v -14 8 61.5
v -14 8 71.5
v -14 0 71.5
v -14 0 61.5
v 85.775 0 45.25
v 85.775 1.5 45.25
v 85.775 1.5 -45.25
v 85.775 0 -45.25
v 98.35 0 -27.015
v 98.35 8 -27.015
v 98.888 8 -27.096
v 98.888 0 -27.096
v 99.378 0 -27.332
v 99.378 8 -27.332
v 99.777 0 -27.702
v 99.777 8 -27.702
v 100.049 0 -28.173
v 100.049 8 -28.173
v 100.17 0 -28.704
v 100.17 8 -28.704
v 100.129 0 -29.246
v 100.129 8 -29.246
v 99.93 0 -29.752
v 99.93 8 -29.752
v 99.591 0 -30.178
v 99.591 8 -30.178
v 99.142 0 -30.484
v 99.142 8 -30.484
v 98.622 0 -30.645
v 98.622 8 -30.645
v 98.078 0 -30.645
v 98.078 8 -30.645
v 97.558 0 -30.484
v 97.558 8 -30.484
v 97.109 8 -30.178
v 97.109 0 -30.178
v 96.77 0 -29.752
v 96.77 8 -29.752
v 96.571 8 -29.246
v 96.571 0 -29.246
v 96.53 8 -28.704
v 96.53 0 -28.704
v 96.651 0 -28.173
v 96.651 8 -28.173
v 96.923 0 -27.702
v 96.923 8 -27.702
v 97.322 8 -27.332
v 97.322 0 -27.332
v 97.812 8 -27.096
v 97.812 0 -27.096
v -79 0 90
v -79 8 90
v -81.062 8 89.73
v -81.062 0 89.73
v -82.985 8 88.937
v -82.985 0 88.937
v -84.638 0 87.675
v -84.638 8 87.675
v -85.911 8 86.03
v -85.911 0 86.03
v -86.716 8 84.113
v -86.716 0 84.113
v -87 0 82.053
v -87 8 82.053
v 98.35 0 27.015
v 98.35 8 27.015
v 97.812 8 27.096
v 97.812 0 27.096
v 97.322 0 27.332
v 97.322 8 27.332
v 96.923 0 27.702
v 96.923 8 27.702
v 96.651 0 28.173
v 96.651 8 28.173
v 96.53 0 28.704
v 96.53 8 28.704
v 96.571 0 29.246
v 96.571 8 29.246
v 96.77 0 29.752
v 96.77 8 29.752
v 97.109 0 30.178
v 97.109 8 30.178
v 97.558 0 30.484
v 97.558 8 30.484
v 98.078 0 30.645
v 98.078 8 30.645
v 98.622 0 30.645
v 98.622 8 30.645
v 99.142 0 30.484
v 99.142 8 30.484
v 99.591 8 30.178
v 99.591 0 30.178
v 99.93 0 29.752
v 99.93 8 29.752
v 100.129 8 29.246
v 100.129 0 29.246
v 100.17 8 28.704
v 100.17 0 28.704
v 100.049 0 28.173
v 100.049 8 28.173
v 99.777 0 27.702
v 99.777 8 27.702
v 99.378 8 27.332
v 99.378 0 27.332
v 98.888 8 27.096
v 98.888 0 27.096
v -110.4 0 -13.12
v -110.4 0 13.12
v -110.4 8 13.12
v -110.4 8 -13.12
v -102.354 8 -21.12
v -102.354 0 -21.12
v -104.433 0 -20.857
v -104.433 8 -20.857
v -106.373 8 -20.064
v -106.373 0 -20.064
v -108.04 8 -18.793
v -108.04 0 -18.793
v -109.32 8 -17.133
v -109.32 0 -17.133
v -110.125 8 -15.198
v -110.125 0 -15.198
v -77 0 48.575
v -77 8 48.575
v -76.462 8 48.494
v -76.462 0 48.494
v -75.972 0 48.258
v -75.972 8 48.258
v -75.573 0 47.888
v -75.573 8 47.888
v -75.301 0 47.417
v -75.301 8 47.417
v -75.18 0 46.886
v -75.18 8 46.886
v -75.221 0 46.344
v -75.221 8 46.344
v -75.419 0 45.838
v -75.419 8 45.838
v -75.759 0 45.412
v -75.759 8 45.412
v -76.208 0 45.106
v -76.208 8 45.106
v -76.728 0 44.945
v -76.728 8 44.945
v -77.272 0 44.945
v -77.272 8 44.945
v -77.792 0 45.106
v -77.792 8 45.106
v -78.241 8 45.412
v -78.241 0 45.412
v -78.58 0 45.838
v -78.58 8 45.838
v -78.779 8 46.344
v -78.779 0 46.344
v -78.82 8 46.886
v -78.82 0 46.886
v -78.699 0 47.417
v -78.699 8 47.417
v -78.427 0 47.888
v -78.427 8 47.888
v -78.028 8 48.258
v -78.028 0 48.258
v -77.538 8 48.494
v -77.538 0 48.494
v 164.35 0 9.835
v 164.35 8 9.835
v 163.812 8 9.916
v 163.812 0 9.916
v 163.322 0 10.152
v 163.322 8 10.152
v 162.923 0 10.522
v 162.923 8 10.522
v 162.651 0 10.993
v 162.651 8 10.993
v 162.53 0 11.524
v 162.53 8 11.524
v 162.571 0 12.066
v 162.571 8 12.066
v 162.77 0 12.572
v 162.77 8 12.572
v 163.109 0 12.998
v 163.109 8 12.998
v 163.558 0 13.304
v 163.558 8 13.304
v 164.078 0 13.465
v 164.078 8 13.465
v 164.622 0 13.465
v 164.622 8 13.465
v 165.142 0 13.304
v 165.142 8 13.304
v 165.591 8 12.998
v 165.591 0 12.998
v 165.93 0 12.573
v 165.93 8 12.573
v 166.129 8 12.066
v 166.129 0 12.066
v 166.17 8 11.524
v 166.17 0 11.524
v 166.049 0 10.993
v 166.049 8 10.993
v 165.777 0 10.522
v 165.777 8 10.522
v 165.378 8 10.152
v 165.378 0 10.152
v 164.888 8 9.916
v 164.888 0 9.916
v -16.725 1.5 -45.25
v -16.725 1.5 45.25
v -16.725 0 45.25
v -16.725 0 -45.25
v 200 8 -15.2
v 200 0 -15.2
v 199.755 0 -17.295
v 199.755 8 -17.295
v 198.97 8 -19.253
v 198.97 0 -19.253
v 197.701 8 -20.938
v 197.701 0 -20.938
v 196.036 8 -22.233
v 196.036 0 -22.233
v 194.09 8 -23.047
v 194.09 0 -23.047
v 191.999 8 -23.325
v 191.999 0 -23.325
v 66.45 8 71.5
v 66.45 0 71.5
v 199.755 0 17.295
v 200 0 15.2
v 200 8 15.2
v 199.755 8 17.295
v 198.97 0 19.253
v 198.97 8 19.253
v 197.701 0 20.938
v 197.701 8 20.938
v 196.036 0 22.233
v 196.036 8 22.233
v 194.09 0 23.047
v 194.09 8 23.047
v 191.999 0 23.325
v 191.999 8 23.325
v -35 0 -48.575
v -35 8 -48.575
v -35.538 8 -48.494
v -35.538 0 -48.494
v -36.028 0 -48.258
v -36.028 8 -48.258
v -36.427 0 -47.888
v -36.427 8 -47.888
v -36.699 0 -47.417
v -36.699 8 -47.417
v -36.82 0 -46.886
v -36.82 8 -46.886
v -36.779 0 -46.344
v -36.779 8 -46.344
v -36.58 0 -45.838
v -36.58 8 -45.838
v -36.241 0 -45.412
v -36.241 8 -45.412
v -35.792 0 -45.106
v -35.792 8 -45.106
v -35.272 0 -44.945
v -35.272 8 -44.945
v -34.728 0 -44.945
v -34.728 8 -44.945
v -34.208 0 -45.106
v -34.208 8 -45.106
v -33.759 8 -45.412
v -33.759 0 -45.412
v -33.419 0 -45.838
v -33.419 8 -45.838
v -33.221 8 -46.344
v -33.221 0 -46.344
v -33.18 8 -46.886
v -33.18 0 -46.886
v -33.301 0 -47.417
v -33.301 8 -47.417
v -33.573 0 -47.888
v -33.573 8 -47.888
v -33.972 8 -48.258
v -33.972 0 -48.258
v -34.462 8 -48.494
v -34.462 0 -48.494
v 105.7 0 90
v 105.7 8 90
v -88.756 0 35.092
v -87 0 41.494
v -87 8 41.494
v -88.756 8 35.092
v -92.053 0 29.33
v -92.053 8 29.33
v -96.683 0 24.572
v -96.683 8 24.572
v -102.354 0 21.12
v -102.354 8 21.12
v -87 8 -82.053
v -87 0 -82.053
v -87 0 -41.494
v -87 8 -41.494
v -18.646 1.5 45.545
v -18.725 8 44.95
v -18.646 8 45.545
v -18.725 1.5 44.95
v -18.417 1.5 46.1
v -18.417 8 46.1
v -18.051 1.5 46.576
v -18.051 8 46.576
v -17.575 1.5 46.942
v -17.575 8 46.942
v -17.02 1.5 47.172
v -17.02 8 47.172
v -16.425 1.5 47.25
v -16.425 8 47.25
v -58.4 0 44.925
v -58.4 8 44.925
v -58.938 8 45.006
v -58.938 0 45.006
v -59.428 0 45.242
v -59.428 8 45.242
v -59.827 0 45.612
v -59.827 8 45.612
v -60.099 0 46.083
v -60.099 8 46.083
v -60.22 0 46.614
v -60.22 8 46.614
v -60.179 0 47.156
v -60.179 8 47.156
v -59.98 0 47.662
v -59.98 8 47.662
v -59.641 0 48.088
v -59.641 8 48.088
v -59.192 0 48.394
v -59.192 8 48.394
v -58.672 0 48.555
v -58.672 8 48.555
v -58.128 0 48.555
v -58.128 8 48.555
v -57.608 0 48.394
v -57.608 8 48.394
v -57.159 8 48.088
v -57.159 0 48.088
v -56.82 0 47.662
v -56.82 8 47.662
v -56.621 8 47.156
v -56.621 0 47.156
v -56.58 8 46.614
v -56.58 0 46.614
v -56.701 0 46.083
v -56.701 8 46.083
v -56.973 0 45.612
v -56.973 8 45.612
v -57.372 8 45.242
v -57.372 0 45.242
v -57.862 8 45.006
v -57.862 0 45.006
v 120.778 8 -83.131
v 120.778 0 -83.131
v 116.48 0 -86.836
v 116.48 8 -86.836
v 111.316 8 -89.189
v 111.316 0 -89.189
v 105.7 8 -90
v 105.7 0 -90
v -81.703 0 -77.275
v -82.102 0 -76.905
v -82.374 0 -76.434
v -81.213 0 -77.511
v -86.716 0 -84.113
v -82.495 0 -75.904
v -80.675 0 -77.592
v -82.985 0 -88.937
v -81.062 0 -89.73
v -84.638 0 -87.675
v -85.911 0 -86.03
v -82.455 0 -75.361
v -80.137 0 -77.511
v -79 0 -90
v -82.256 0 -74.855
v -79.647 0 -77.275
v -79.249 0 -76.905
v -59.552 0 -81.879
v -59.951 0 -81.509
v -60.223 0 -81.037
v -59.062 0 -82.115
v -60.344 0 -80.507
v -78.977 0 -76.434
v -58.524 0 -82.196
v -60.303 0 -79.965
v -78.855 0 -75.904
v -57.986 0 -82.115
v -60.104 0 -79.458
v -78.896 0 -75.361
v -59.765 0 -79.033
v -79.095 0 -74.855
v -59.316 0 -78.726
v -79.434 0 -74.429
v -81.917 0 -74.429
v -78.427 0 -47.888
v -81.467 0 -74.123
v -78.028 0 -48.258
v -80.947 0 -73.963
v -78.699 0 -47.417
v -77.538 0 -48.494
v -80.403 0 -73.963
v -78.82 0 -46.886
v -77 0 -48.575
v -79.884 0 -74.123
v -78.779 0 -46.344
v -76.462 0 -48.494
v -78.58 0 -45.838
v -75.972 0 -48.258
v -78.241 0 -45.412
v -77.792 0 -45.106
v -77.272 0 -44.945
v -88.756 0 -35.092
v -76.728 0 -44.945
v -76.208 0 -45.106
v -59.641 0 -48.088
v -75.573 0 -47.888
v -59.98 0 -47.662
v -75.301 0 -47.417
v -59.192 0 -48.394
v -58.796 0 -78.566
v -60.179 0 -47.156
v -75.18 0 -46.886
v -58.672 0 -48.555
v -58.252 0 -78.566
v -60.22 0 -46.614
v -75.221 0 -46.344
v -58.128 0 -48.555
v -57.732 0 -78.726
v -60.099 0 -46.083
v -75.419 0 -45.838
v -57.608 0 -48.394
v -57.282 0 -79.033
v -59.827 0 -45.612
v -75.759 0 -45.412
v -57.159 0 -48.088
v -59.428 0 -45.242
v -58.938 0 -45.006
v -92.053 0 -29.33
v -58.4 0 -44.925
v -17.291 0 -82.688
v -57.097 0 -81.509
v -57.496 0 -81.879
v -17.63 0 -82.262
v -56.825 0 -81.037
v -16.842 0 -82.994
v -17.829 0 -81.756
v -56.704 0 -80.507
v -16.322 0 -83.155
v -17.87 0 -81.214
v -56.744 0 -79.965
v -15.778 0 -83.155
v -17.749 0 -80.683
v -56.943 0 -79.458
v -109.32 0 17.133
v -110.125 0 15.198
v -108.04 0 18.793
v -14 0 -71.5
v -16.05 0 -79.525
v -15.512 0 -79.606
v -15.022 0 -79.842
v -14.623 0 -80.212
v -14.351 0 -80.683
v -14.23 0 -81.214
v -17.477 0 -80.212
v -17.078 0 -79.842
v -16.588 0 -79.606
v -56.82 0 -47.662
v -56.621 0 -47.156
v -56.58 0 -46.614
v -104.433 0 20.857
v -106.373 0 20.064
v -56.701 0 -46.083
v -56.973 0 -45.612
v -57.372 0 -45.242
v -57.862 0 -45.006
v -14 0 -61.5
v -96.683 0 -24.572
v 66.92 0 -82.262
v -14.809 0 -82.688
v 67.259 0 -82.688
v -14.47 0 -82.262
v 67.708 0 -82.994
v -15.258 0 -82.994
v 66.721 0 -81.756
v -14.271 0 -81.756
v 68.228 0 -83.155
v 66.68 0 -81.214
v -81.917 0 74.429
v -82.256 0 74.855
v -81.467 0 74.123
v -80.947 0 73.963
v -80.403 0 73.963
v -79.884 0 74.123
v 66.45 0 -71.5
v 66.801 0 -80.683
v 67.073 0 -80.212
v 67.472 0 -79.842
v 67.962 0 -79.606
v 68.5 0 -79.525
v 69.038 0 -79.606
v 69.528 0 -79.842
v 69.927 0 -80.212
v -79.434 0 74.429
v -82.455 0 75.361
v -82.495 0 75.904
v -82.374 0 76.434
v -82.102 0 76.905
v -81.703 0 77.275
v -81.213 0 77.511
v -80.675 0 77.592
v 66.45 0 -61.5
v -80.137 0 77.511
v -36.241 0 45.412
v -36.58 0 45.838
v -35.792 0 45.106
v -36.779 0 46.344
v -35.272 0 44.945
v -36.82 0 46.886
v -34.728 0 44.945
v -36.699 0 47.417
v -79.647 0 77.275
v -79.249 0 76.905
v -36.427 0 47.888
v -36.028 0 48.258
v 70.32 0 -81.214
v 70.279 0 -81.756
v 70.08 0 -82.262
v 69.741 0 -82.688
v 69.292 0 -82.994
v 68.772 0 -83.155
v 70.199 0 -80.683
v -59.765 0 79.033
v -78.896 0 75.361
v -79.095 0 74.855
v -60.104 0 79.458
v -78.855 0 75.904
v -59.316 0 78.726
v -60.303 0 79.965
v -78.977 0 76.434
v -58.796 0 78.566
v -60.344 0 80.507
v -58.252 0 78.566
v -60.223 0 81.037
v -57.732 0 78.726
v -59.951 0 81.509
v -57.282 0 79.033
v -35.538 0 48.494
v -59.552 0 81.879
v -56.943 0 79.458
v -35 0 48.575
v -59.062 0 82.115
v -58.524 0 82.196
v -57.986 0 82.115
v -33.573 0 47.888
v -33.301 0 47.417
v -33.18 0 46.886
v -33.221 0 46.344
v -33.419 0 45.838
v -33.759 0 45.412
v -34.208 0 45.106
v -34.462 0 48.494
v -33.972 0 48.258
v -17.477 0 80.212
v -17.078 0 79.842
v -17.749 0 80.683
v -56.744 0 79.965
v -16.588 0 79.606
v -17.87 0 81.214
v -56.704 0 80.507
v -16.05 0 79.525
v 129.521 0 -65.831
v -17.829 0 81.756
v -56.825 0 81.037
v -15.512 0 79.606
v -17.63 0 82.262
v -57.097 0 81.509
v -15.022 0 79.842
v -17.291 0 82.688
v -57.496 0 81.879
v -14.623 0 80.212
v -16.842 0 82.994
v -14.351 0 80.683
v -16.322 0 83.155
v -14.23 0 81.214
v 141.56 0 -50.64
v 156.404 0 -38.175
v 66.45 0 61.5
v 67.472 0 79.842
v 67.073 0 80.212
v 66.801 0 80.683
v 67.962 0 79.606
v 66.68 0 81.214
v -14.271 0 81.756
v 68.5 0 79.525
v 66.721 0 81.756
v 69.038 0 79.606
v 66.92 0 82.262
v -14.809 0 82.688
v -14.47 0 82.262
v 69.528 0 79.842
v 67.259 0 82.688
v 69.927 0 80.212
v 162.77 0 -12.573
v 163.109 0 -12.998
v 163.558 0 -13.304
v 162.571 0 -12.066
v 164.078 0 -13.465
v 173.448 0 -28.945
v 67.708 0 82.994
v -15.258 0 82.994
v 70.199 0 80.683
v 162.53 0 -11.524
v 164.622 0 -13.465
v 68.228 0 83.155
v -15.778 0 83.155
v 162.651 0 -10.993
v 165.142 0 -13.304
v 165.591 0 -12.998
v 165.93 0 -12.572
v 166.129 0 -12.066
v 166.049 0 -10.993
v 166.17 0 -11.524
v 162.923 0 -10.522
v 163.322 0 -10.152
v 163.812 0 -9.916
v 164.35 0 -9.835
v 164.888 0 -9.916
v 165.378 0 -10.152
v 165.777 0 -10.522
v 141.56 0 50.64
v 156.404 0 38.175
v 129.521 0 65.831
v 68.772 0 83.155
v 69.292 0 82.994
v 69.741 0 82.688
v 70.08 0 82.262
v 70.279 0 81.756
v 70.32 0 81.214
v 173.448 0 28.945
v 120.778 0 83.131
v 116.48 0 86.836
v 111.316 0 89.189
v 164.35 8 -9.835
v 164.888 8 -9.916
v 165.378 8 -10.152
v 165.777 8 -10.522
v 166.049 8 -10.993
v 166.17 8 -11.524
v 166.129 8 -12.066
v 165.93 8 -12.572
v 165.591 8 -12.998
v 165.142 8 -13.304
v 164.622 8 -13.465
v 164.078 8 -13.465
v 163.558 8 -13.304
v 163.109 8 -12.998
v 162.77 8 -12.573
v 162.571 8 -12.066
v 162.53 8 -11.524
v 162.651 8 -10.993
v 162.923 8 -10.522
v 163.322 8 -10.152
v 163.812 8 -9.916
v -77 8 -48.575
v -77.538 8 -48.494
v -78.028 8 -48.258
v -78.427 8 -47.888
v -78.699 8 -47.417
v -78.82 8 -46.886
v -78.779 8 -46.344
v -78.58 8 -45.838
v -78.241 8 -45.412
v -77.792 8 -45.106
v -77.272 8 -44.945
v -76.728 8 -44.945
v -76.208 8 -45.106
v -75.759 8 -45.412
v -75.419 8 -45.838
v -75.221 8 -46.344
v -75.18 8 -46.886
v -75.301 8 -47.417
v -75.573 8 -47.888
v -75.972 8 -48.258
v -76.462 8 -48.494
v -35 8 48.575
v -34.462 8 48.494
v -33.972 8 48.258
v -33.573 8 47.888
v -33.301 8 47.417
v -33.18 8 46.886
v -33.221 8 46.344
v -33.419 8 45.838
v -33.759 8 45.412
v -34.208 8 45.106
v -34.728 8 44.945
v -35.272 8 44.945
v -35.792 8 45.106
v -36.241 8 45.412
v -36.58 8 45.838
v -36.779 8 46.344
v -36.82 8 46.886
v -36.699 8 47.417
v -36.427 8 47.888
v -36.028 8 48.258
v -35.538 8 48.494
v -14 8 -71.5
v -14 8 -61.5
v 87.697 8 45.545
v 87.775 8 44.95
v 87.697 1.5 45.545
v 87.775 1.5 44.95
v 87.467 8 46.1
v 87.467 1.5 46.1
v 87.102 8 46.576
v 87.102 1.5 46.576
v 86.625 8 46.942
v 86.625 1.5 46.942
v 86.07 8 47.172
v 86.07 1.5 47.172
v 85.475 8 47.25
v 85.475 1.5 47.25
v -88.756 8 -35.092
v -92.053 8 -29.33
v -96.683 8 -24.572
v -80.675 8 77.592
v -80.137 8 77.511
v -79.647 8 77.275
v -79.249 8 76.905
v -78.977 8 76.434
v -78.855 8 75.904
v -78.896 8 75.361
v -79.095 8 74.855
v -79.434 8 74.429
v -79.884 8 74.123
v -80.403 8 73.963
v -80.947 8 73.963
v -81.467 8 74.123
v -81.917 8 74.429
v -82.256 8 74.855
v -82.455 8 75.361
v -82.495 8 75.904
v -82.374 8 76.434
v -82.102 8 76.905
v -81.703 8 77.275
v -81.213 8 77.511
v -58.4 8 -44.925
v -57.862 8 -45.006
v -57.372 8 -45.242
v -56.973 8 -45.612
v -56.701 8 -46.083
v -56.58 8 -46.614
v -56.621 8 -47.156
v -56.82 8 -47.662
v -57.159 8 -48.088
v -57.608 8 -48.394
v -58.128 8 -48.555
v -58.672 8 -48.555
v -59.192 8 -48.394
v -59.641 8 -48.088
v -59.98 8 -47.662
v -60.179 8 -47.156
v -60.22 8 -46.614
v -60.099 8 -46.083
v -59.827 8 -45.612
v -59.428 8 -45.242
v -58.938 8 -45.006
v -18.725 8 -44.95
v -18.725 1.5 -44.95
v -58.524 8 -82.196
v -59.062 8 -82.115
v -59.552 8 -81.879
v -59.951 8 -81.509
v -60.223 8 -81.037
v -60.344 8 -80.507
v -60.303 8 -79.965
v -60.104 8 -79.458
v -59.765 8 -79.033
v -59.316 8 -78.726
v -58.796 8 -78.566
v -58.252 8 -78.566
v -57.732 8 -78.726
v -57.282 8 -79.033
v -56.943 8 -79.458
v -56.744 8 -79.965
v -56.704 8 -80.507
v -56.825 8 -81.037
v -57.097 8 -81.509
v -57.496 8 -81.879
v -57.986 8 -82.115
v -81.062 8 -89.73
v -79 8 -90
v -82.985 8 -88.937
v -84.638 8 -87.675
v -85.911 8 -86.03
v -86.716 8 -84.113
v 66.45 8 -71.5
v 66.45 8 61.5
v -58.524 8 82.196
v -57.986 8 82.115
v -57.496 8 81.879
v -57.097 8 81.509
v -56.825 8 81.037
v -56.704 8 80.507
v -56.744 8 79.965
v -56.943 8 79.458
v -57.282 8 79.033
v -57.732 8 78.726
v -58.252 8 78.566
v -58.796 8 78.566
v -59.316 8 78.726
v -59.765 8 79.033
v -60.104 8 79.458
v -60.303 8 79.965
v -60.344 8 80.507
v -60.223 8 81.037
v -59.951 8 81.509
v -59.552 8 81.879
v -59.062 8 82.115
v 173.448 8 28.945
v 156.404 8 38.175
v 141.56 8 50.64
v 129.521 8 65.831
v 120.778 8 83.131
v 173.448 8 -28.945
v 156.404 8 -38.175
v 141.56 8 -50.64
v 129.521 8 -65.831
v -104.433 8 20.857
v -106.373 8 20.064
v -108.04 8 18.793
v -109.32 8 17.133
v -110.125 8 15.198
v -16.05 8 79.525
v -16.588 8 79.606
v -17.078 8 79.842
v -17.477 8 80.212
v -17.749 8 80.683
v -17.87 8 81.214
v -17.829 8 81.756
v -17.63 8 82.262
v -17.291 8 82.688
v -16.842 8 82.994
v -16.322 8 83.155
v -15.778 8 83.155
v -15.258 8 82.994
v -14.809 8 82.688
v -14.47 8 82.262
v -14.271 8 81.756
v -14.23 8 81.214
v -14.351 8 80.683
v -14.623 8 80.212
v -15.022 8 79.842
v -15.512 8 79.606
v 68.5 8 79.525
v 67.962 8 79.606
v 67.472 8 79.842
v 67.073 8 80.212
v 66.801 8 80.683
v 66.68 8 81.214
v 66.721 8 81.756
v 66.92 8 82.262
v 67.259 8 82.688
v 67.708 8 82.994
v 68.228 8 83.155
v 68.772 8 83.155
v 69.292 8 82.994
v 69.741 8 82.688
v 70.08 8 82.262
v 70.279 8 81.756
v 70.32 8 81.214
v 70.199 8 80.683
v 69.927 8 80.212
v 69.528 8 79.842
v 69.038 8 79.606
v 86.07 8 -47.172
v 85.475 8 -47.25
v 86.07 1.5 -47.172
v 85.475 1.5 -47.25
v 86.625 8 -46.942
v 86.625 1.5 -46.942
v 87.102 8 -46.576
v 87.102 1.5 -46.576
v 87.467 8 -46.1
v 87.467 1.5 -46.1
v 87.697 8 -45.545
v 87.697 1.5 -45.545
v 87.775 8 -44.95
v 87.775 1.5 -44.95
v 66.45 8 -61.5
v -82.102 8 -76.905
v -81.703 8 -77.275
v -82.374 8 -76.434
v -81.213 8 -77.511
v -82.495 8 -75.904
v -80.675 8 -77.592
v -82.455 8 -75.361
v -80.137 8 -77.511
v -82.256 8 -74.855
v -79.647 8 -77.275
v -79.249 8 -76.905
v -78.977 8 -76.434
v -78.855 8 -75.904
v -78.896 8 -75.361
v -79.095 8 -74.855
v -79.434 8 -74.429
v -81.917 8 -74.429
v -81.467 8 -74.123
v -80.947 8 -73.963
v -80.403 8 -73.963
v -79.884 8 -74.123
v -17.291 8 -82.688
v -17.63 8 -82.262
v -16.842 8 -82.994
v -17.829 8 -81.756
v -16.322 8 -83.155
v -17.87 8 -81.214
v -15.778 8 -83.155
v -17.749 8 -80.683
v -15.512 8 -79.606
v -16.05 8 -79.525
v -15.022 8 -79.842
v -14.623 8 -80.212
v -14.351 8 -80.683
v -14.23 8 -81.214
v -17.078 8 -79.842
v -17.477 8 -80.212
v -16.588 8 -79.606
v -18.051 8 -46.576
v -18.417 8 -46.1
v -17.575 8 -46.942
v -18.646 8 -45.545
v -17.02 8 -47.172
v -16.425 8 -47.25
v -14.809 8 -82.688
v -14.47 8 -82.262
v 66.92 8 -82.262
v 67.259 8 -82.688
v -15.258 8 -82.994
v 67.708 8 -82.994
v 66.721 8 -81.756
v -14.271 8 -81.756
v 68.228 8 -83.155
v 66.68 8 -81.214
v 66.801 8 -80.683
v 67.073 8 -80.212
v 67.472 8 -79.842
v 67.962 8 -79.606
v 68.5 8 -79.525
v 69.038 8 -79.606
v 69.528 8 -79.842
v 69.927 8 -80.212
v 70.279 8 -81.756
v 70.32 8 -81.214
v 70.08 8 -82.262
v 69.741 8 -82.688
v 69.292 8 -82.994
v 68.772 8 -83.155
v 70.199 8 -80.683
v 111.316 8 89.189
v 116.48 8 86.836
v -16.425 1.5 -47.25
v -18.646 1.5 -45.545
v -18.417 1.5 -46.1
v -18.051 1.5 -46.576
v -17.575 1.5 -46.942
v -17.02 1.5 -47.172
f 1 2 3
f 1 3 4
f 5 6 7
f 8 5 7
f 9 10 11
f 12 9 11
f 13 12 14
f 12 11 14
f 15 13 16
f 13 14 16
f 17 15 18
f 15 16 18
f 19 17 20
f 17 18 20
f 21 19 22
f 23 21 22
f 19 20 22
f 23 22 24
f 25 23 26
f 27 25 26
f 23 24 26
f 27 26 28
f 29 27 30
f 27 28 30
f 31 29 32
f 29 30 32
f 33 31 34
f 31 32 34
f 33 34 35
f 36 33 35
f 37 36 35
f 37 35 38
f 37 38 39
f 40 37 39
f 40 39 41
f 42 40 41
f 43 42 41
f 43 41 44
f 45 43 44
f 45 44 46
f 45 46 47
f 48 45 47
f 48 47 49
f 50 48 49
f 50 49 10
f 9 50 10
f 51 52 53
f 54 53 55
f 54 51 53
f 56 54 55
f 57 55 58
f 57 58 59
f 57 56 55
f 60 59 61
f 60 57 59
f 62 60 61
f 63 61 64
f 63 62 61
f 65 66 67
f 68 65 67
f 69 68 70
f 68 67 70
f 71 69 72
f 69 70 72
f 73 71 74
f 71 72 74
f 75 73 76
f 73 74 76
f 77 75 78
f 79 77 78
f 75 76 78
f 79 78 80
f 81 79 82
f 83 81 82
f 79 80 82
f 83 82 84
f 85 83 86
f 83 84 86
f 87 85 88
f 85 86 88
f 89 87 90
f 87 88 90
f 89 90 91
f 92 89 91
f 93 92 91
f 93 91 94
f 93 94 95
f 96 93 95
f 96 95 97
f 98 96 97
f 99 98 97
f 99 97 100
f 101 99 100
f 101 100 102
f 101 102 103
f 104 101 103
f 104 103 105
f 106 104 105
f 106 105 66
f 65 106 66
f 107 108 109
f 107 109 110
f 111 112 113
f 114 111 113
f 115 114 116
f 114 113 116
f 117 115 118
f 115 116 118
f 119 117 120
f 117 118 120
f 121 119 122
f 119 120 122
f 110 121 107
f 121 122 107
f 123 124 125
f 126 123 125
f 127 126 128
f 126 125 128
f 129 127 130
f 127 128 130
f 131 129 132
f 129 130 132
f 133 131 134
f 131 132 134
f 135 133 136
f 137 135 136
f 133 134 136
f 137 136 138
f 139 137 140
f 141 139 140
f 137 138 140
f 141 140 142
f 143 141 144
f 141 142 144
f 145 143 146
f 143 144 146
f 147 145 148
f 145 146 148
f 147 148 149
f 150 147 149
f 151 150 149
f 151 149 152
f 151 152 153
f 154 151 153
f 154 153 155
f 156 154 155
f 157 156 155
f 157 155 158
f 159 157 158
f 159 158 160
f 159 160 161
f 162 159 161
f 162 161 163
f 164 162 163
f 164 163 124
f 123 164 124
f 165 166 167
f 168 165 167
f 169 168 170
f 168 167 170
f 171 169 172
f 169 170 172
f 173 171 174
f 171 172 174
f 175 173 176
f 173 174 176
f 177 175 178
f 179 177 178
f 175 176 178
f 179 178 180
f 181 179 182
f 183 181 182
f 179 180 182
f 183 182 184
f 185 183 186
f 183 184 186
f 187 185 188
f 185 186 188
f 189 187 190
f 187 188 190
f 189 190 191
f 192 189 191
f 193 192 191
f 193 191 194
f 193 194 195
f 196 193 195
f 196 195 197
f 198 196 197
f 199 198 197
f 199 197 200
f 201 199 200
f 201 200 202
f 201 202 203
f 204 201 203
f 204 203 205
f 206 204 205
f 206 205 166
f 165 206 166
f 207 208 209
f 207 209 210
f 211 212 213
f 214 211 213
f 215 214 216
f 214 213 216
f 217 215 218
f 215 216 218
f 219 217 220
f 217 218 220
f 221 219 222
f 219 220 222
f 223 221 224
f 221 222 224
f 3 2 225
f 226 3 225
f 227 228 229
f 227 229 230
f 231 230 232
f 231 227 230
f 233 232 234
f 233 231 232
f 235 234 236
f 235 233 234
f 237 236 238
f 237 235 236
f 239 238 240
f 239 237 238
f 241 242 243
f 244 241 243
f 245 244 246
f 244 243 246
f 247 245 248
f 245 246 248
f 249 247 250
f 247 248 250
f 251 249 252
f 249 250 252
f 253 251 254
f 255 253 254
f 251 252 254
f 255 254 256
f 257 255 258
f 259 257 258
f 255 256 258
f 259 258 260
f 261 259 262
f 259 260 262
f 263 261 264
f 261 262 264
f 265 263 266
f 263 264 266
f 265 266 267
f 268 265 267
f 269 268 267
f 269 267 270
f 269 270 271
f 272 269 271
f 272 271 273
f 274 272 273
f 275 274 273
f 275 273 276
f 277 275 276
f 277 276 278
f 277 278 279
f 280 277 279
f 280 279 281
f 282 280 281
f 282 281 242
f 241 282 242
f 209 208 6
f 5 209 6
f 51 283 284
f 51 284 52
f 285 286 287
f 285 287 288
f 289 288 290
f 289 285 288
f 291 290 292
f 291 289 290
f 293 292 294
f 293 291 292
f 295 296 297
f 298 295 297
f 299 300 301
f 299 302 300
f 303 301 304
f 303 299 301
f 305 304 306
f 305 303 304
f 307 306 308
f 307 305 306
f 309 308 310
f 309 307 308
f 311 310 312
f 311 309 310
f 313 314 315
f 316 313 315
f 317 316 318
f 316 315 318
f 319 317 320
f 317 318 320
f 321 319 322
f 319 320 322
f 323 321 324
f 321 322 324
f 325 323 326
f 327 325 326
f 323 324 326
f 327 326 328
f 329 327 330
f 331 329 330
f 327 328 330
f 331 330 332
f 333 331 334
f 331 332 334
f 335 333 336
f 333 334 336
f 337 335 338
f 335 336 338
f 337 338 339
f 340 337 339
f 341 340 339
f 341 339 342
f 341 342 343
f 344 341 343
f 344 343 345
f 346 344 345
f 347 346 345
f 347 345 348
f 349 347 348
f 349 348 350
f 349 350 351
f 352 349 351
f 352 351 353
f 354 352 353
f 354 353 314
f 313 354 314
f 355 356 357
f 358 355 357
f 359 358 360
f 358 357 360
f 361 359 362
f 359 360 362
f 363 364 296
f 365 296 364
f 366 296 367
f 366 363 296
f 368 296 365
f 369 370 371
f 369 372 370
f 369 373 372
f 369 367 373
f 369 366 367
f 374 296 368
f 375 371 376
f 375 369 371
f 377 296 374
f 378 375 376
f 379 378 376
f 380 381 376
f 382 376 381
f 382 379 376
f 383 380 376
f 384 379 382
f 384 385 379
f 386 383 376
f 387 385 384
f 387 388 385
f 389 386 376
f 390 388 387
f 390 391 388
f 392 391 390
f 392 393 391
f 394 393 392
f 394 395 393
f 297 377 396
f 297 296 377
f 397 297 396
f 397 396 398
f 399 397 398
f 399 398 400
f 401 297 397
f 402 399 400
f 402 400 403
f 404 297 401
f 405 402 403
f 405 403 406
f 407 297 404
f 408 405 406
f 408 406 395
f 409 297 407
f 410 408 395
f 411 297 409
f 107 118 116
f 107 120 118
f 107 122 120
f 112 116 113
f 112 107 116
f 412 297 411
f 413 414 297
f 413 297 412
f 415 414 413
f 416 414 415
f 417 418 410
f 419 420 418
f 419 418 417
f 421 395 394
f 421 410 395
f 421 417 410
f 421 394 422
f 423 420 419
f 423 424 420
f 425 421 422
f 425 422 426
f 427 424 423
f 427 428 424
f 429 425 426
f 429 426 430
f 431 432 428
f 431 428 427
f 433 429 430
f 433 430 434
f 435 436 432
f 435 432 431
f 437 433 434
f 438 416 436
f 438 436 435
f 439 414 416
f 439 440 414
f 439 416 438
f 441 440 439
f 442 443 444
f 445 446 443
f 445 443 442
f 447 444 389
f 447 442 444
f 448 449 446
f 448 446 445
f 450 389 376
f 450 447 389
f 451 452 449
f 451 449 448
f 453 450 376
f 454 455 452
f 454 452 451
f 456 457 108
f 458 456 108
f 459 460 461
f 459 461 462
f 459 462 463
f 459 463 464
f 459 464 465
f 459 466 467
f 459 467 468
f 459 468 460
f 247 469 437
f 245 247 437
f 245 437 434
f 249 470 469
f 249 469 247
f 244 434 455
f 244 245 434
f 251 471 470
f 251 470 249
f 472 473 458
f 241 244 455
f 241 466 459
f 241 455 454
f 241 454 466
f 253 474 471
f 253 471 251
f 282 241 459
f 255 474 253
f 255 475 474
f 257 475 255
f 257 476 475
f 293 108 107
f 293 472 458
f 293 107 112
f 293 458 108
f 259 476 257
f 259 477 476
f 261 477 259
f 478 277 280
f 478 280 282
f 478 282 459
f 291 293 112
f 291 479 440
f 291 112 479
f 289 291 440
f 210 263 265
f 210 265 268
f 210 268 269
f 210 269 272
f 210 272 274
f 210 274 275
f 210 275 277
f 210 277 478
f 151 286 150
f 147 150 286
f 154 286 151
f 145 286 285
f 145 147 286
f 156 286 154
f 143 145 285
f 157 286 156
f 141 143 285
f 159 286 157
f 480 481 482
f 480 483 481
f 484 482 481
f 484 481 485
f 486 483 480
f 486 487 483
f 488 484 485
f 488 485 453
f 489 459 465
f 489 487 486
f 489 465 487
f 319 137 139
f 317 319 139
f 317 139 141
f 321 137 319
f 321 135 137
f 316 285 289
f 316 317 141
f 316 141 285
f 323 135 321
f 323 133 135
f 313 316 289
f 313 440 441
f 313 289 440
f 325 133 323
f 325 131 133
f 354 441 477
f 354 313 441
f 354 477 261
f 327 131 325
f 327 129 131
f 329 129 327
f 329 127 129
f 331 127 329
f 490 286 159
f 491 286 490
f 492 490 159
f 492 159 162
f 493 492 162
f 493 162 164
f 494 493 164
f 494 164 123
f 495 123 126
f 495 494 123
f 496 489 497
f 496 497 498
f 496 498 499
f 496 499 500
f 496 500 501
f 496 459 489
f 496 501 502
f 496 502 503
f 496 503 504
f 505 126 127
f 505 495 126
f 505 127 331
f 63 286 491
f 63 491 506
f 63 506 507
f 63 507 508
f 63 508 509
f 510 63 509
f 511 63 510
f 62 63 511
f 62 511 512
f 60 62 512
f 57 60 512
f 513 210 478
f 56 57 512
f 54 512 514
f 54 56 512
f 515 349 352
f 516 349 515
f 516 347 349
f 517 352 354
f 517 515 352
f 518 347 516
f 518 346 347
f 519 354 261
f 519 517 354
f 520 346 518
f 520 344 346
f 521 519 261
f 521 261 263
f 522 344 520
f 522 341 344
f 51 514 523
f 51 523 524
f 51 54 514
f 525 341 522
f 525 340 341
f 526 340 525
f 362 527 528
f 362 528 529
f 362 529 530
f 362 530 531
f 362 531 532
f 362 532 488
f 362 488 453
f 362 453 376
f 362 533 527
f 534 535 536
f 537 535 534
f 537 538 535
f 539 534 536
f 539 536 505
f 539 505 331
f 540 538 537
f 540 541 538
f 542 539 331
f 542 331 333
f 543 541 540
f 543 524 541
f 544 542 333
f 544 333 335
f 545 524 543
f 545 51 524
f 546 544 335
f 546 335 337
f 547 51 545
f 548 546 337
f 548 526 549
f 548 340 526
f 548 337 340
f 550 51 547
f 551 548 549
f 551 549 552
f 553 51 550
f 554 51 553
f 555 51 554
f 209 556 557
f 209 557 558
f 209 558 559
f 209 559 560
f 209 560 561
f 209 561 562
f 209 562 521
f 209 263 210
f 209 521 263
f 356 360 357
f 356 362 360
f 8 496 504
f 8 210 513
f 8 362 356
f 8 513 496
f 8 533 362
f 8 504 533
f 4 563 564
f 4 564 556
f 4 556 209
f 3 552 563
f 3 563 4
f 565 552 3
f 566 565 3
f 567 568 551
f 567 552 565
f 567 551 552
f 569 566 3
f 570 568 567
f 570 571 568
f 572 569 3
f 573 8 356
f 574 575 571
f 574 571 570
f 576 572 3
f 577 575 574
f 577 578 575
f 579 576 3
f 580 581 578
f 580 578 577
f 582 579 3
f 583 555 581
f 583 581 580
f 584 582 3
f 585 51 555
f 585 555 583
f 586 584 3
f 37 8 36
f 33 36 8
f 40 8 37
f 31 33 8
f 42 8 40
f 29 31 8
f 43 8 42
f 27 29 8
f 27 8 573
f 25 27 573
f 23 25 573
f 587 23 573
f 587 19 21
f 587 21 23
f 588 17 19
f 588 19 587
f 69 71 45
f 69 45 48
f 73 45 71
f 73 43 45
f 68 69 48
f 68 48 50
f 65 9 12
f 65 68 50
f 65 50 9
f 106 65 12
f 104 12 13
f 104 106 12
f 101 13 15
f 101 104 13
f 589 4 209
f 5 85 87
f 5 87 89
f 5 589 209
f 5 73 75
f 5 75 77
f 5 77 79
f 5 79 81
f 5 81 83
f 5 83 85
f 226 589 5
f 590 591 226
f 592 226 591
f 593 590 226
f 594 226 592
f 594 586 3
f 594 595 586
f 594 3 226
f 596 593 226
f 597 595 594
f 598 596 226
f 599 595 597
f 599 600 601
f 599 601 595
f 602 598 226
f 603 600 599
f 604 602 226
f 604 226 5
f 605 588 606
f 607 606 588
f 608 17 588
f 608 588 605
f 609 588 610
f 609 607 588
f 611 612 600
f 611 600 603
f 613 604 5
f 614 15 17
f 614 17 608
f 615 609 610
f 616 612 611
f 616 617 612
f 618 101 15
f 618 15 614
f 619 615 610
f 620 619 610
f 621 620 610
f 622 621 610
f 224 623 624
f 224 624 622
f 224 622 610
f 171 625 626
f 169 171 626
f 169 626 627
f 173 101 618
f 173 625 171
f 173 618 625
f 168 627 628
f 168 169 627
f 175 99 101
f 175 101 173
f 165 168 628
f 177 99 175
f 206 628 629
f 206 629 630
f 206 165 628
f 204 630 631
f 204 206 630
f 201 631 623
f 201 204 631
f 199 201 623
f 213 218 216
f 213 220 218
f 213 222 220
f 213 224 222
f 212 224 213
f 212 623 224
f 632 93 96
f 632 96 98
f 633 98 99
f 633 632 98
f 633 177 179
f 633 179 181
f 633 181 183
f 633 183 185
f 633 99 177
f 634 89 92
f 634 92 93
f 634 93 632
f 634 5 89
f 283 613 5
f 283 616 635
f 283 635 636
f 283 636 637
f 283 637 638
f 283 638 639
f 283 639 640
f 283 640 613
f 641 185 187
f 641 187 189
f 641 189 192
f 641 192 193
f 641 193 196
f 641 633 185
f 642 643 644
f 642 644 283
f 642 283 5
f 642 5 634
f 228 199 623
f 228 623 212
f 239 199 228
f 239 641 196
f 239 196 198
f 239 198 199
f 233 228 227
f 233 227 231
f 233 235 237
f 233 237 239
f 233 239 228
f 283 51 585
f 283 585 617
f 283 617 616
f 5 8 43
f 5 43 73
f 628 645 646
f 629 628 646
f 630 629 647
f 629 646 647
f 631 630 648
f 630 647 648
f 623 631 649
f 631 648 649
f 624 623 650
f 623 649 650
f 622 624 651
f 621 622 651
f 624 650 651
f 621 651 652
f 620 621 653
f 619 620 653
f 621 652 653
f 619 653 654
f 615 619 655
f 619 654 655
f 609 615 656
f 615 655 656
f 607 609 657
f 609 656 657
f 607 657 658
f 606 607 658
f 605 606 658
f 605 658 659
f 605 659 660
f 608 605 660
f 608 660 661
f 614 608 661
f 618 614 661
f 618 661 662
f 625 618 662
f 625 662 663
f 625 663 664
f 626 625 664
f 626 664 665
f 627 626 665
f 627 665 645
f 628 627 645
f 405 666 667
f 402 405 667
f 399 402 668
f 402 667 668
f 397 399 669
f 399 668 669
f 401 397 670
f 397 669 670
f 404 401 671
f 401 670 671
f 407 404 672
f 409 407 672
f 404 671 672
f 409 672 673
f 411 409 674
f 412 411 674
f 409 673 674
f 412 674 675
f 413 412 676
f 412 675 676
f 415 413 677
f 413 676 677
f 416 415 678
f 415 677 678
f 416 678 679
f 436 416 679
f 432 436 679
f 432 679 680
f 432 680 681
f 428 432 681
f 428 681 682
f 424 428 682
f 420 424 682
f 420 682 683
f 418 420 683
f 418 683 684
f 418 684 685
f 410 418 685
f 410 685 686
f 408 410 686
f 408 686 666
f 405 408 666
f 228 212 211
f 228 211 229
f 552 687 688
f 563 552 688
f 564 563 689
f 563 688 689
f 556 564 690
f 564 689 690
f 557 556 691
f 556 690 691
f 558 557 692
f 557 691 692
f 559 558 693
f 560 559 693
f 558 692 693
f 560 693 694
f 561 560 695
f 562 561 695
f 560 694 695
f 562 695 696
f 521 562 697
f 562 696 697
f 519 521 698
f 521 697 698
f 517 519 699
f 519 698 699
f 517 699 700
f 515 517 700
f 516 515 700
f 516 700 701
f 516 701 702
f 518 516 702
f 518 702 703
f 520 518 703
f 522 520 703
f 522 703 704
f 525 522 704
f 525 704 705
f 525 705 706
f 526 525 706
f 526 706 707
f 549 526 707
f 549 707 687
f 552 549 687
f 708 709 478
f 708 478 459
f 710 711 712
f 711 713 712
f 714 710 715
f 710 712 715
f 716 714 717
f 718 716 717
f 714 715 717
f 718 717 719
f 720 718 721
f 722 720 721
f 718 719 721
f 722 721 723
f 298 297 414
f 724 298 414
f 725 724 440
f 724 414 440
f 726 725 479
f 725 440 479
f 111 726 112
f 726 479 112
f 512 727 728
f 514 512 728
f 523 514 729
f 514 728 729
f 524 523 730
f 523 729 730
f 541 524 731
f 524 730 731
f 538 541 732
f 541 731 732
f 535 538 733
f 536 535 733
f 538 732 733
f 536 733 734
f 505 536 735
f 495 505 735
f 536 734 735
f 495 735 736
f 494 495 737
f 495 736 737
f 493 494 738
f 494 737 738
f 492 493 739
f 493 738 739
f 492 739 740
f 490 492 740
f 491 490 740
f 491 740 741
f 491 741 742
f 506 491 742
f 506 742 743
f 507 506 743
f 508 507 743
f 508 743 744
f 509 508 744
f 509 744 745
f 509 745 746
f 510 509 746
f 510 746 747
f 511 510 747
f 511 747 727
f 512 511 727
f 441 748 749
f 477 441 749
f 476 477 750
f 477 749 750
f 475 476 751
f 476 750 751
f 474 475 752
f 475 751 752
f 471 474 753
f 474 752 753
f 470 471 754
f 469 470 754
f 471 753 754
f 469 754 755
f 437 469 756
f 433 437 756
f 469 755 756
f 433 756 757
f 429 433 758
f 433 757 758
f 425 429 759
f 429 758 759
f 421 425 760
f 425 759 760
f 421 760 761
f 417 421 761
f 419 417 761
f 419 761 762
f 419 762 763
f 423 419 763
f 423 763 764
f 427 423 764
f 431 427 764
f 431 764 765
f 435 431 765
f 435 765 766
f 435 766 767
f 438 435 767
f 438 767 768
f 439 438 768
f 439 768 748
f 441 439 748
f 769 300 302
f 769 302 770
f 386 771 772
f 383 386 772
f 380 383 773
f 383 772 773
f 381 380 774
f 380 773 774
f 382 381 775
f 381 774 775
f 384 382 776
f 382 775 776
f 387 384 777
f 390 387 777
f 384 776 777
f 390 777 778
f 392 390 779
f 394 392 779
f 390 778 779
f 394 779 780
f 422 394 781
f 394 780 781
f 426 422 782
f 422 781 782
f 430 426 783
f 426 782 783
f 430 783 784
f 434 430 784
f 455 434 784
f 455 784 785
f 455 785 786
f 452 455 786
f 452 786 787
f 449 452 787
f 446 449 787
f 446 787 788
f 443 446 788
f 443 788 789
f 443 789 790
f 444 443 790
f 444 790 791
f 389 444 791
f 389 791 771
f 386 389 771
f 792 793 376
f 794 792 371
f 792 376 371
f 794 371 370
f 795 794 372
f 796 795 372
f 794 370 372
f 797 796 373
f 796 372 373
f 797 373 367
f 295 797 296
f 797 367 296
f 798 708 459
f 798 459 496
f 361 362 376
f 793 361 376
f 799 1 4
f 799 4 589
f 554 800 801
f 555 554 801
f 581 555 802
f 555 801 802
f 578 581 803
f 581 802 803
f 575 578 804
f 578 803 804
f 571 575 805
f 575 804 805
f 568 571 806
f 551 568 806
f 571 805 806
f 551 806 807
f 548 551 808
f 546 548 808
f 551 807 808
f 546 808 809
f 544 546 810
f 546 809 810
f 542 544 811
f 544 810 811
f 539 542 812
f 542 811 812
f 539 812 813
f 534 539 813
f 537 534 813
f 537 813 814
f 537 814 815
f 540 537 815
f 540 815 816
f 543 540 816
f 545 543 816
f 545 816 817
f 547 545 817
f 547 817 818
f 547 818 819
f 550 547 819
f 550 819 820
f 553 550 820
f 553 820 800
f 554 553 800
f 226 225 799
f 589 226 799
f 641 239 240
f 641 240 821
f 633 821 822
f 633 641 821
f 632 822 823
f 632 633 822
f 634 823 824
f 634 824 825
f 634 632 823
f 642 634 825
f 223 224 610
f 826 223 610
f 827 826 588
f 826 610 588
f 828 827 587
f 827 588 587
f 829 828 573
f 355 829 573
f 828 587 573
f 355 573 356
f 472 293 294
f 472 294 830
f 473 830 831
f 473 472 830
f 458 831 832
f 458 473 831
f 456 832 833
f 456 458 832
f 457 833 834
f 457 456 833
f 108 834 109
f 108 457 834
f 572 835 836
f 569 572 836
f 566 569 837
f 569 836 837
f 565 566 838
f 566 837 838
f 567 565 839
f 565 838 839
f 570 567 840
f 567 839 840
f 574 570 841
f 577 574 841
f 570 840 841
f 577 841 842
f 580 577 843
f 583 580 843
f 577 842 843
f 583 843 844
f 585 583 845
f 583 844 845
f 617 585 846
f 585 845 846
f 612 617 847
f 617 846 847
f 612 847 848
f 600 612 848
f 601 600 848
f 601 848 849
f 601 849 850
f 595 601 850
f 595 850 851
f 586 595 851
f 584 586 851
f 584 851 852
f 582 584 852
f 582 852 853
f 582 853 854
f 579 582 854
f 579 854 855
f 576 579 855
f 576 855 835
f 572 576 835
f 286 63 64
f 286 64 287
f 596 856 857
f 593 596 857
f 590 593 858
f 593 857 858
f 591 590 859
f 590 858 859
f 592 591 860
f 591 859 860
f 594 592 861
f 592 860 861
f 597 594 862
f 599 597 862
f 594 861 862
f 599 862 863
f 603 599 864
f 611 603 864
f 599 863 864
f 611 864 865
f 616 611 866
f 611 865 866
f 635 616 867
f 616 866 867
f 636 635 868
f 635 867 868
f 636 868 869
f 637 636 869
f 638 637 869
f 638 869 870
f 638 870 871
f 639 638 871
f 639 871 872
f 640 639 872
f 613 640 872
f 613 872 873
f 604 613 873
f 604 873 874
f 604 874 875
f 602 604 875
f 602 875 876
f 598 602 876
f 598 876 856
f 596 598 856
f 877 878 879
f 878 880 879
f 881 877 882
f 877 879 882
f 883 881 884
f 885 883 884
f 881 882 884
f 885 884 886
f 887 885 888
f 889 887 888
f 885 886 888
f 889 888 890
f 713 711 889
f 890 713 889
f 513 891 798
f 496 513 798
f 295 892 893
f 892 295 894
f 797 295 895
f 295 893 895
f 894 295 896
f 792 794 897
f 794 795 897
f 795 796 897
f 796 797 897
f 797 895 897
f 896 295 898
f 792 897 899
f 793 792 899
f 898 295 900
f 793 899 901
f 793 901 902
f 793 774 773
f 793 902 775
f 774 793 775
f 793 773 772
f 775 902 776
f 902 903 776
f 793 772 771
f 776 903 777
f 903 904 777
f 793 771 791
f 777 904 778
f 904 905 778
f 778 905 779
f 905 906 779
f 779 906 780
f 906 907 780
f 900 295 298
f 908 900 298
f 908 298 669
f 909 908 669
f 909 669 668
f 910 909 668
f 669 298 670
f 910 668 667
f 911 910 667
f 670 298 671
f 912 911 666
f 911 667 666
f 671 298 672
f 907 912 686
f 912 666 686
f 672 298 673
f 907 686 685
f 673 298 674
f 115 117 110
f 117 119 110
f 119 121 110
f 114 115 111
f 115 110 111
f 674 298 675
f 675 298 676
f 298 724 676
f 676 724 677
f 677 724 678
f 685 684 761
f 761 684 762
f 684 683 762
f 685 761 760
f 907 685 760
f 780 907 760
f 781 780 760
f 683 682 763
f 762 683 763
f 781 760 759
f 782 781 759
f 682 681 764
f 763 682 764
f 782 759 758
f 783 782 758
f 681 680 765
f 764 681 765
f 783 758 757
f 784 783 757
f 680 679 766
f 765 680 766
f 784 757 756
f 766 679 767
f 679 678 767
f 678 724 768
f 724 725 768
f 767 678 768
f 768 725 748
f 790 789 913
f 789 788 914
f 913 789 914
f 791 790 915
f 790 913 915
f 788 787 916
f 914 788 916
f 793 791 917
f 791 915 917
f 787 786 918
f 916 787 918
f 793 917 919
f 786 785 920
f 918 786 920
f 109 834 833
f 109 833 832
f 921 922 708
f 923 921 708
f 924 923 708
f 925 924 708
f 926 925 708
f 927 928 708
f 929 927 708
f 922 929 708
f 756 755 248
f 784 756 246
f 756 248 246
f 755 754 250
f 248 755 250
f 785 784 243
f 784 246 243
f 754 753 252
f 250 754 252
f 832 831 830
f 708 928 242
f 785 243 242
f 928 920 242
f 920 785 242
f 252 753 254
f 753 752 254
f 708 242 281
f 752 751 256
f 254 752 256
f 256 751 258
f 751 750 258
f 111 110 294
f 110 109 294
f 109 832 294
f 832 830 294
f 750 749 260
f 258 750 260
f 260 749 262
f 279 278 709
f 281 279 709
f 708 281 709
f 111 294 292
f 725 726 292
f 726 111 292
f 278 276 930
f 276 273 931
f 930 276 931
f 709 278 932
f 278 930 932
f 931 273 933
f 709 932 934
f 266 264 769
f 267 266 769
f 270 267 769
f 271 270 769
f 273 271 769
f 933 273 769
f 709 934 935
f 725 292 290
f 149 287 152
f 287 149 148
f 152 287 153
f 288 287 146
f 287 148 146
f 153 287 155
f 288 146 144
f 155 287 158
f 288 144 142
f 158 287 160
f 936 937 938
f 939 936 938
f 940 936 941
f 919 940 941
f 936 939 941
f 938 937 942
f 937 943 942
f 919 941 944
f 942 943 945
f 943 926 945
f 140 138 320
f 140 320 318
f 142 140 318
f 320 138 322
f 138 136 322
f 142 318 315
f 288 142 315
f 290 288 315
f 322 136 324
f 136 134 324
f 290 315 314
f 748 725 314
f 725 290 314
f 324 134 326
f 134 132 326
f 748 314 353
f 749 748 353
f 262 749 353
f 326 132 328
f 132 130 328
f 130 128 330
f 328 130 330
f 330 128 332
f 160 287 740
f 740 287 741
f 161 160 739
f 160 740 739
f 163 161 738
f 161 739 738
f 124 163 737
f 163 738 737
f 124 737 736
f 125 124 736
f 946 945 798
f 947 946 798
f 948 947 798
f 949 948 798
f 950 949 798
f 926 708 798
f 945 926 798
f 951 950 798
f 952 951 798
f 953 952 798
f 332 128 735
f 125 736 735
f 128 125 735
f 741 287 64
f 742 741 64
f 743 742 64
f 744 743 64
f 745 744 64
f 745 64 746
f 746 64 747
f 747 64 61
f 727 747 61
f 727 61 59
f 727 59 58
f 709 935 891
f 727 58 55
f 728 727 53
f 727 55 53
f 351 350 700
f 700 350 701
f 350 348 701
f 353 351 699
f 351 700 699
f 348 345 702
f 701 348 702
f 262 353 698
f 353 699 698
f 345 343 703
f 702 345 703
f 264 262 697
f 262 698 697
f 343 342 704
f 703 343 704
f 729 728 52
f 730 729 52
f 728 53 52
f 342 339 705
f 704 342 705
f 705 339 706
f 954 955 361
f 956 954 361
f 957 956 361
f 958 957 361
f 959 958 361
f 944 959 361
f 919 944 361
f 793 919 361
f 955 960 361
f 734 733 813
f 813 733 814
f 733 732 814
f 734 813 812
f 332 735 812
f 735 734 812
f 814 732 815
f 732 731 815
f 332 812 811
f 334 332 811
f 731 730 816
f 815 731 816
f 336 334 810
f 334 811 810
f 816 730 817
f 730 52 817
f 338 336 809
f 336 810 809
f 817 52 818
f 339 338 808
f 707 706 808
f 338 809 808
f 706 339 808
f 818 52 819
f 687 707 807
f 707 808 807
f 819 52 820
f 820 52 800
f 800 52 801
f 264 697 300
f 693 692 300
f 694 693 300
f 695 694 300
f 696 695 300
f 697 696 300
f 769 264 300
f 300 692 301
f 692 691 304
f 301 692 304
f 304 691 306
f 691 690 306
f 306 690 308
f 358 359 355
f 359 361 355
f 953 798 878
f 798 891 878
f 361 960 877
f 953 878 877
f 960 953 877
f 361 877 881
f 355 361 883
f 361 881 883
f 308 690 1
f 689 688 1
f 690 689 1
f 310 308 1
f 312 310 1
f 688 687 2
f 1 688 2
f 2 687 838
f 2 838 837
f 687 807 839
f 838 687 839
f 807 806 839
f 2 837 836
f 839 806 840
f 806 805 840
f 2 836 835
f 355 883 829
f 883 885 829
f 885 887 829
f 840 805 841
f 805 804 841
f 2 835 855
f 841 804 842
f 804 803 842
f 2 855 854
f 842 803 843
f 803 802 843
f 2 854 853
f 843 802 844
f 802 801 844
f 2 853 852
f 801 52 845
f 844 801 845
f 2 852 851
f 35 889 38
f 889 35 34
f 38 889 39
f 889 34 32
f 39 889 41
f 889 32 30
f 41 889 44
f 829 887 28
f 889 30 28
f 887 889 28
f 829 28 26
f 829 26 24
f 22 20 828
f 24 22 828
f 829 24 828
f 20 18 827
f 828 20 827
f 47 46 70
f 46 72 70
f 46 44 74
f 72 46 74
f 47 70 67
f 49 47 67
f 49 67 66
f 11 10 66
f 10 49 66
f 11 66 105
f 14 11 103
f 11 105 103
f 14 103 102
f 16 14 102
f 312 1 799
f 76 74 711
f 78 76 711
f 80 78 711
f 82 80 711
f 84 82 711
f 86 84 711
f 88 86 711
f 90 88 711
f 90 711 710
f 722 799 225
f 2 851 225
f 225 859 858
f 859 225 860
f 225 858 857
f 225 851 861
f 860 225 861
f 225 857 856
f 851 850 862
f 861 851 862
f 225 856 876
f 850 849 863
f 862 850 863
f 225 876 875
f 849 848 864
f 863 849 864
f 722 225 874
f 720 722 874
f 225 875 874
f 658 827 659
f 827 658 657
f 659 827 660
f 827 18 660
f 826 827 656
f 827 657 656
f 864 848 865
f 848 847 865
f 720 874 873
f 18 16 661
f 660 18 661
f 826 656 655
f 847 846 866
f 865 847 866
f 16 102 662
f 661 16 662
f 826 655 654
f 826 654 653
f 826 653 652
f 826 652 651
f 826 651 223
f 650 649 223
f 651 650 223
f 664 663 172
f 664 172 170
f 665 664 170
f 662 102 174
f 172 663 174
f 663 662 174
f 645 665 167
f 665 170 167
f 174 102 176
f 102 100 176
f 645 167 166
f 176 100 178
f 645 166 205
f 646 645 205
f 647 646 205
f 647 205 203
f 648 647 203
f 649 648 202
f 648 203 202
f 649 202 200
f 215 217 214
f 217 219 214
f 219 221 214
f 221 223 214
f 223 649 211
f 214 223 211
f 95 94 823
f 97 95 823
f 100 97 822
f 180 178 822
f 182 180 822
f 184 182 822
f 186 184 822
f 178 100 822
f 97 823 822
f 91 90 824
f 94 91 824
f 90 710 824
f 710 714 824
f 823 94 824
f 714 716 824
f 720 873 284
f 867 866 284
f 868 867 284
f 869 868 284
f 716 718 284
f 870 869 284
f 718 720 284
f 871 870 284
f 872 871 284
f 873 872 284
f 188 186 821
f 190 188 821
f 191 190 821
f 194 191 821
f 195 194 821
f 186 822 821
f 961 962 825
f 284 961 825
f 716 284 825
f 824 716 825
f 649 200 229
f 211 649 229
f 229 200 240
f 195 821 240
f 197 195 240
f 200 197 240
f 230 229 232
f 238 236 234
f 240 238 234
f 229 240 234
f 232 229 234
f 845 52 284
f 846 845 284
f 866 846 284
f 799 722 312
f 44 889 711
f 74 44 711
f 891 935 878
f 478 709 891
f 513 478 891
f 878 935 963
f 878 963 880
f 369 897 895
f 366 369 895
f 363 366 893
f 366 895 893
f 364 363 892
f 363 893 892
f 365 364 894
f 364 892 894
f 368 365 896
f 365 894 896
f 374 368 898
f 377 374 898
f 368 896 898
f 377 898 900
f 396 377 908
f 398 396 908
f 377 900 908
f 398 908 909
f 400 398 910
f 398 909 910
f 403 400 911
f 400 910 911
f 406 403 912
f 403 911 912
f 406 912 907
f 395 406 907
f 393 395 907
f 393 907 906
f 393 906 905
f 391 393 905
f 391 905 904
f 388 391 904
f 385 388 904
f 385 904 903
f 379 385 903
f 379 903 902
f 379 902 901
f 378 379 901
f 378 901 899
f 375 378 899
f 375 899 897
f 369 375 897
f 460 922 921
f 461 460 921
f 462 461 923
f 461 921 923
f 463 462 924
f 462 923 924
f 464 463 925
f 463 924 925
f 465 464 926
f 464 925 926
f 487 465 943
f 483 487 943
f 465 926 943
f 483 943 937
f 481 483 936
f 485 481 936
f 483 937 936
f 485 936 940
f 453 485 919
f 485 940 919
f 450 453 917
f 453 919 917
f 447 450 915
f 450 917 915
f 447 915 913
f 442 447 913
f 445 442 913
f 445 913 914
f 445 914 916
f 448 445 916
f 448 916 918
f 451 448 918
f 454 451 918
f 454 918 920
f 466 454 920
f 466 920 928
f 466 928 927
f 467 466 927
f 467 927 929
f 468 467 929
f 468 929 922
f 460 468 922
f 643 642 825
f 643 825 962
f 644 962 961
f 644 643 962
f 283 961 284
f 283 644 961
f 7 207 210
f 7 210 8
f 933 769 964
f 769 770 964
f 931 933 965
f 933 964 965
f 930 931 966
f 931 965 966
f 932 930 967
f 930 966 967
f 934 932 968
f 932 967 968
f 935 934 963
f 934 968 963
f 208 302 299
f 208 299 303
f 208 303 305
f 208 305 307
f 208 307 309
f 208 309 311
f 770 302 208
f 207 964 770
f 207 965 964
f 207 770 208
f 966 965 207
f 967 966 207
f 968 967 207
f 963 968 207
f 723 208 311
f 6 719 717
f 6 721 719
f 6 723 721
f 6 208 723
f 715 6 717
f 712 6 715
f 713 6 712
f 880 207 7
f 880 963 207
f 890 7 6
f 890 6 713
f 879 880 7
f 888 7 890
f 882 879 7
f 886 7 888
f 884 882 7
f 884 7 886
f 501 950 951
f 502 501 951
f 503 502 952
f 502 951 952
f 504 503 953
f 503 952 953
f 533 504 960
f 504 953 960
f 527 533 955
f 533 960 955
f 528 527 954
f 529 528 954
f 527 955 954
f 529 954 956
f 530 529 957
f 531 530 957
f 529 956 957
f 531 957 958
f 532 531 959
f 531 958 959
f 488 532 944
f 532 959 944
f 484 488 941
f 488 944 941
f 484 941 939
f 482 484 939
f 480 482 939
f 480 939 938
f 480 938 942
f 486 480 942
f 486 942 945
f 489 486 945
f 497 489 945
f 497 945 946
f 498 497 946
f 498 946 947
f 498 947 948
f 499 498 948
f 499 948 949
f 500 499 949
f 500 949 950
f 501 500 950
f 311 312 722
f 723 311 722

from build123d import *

# Parameters (mm, degrees)
SALIENTE_EXTRUIR1_DEPTH = 8
CROQUIS2_R              = 1.825
CROQUIS2_W              = 80.45
CROQUIS2_H              = 10
CORTAR_EXTRUIR1_DEPTH   = 220.463870727
CROQUIS3_R              = 1.825
CORTAR_EXTRUIR2_DEPTH   = 220.463870727
CROQUIS4_W              = 106.5
CROQUIS4_H              = 94.5
CORTAR_EXTRUIR3_DEPTH   = 6.5
REDONDEO1_R             = 2.3
CROQUIS5_R              = 1.825
CORTAR_EXTRUIR4_DEPTH   = 220.463870727
CROQUIS6_W              = 102.5
CROQUIS6_H              = 90.5
CORTAR_EXTRUIR5_DEPTH   = 220.414312556
CROQUIS9_R              = 1.825
CORTAR_EXTRUIR7_DEPTH   = 220.463870727
CROQUIS11_R             = 1.825
CORTAR_EXTRUIR8_DEPTH   = 220.463870727


with BuildPart() as part:
    # Croquis1 → Saliente-Extruir1 (new body)
    with BuildSketch(Plane(origin=(0, 0, 0), x_dir=(1, 0, 0), z_dir=(0, 1, 0))):
        with BuildLine():
            Line((0, 0), (200, 0))
            Line((200, 0), (200, 15.2))
            ThreePointArc((200, 15.2), (197.701163079, 20.938172036), (191.9990235, 23.3249845))
            ThreePointArc((191.9990235, 23.3249845), (148.666739026, 44.032184001), (120.7781513, 83.1307986))
            ThreePointArc((120.7781513, 83.1307986), (113.982057966, 88.196272982), (105.7, 90))
            Line((105.7, 90), (0, 90))
            Line((0, 90), (-79, 90))
            ThreePointArc((-79, 90), (-84.638146896, 87.675499941), (-86.999825594, 82.052824894))
            Line((-86.999825594, 82.052824894), (-86.999825594, 41.494023494))
            ThreePointArc((-86.999825594, 41.494023494), (-92.052704294, 29.329564667), (-102.353503833, 21.119864881))
            ThreePointArc((-102.353503833, 21.119864881), (-108.040391417, 18.79326931), (-110.4, 13.12))
            Line((-110.4, 13.12), (-110.4, 0))
            Line((-110.4, 0), (0, 0))
        make_face()
    extrude(amount=SALIENTE_EXTRUIR1_DEPTH)

    # Simetría2: part across plane


with BuildPart() as part_1:
    add(part.part)
    add(part.part.mirror(Plane(origin=(0, 8, 0), x_dir=(1, 0, 0), z_dir=(0, 0, -1))))

    # Croquis2 → Cortar-Extruir1 (cut, through all)
    with BuildSketch(Plane(origin=(0, 8, 0), x_dir=(1, 0, 0), z_dir=(0, 1, 0))):
        with Locations(Location((68.5, 81.35, 0), (0, 0, 270))):
            Circle(CROQUIS2_R)
        with Locations(Location((-16.05, 81.35, 0), (0, 0, 270))):
            Circle(CROQUIS2_R)
        with Locations(Location((68.5, -81.35, 0), (0, 0, 90))):
            Circle(CROQUIS2_R)
        with Locations(Location((-16.05, -81.35, 0), (0, 0, 90))):
            Circle(CROQUIS2_R)
        with Locations((26.225, -66.5)):
            Rectangle(CROQUIS2_W, CROQUIS2_H)
        with Locations((26.225, 66.5)):
            Rectangle(CROQUIS2_W, CROQUIS2_H)
    extrude(amount=-CORTAR_EXTRUIR1_DEPTH, mode=Mode.SUBTRACT)

    # Croquis3 → Cortar-Extruir2 (cut, through all)
    with BuildSketch(Plane(origin=(0, 8, 0), x_dir=(1, 0, 0), z_dir=(0, 1, 0))):
        with Locations(Location((-76.999825594, -46.75, 0), (0, 0, 270))):
            Circle(CROQUIS3_R)
        with Locations(Location((-34.999825594, -46.75, 0), (0, 0, 270))):
            Circle(CROQUIS3_R)
        with Locations(Location((-34.999825594, 46.75, 0), (0, 0, 90))):
            Circle(CROQUIS3_R)
        with Locations(Location((-76.999825594, 46.75, 0), (0, 0, 90))):
            Circle(CROQUIS3_R)
    extrude(amount=-CORTAR_EXTRUIR2_DEPTH, mode=Mode.SUBTRACT)

    # Croquis4 → Cortar-Extruir3 (cut)
    with BuildSketch(Plane(origin=(0, 8, 0), x_dir=(1, 0, 0), z_dir=(0, 1, 0))):
        with Locations((34.525174406, 0)):
            Rectangle(CROQUIS4_W, CROQUIS4_H)
    extrude(amount=-CORTAR_EXTRUIR3_DEPTH, mode=Mode.SUBTRACT)

    # Redondeo1
    redondeo1_edges = [part_1.edges().sort_by_distance(p)[0] for p in [
        (87.775174406, 4.75, -47.25),
        (87.775174406, 4.75, 47.25),
        (-18.724825594, 4.75, 47.25),
        (-18.724825594, 4.75, -47.25),
    ]]
    fillet(redondeo1_edges, radius=REDONDEO1_R)

    # Croquis5 → Cortar-Extruir4 (cut, through all)
    with BuildSketch(Plane(origin=(0, 8, 0), x_dir=(1, 0, 0), z_dir=(0, 1, 0))):
        with Locations(Location((98.35, 28.84, 0), (0, 0, 270))):
            Circle(CROQUIS5_R)
        with Locations(Location((98.35, -28.84, 0), (0, 0, 90))):
            Circle(CROQUIS5_R)
        with Locations(Location((164.35, 11.66, 0), (0, 0, 270))):
            Circle(CROQUIS5_R)
        with Locations(Location((164.35, -11.66, 0), (0, 0, 90))):
            Circle(CROQUIS5_R)
    extrude(amount=-CORTAR_EXTRUIR4_DEPTH, mode=Mode.SUBTRACT)

    # Croquis6 → Cortar-Extruir5 (cut, through all)
    with BuildSketch(Plane(origin=(0, 1.5, 0), x_dir=(1, 0, 0), z_dir=(0, 1, 0))):
        with Locations((34.525174406, 0)):
            Rectangle(CROQUIS6_W, CROQUIS6_H)
    extrude(amount=-CORTAR_EXTRUIR5_DEPTH, mode=Mode.SUBTRACT)

    # Croquis9 → Cortar-Extruir7 (cut, through all)
    with BuildSketch(Plane(origin=(0, 8, 0), x_dir=(1, 0, 0), z_dir=(0, 1, 0))):
        with Locations(Location((-80.675393895, -75.767215538, 0), (0, 0, 270))):
            Circle(CROQUIS9_R)
        with Locations(Location((-58.52366486, -80.370640978, 0), (0, 0, 270))):
            Circle(CROQUIS9_R)
        with Locations(Location((-58.52366486, 80.370640978, 0), (0, 0, 90))):
            Circle(CROQUIS9_R)
        with Locations(Location((-80.675393895, 75.767215538, 0), (0, 0, 90))):
            Circle(CROQUIS9_R)
    extrude(amount=-CORTAR_EXTRUIR7_DEPTH, mode=Mode.SUBTRACT)

    # Croquis11 → Cortar-Extruir8 (cut, through all)
    with BuildSketch(Plane(origin=(0, 8, 0), x_dir=(1, 0, 0), z_dir=(0, 1, 0))):
        with Locations(Location((-58.4, 46.75, 0), (0, 0, 270))):
            Circle(CROQUIS11_R)
        with Locations(Location((-58.4, -46.75, 0), (0, 0, 90))):
            Circle(CROQUIS11_R)
    extrude(amount=-CORTAR_EXTRUIR8_DEPTH, mode=Mode.SUBTRACT)


solid = part_1.part
